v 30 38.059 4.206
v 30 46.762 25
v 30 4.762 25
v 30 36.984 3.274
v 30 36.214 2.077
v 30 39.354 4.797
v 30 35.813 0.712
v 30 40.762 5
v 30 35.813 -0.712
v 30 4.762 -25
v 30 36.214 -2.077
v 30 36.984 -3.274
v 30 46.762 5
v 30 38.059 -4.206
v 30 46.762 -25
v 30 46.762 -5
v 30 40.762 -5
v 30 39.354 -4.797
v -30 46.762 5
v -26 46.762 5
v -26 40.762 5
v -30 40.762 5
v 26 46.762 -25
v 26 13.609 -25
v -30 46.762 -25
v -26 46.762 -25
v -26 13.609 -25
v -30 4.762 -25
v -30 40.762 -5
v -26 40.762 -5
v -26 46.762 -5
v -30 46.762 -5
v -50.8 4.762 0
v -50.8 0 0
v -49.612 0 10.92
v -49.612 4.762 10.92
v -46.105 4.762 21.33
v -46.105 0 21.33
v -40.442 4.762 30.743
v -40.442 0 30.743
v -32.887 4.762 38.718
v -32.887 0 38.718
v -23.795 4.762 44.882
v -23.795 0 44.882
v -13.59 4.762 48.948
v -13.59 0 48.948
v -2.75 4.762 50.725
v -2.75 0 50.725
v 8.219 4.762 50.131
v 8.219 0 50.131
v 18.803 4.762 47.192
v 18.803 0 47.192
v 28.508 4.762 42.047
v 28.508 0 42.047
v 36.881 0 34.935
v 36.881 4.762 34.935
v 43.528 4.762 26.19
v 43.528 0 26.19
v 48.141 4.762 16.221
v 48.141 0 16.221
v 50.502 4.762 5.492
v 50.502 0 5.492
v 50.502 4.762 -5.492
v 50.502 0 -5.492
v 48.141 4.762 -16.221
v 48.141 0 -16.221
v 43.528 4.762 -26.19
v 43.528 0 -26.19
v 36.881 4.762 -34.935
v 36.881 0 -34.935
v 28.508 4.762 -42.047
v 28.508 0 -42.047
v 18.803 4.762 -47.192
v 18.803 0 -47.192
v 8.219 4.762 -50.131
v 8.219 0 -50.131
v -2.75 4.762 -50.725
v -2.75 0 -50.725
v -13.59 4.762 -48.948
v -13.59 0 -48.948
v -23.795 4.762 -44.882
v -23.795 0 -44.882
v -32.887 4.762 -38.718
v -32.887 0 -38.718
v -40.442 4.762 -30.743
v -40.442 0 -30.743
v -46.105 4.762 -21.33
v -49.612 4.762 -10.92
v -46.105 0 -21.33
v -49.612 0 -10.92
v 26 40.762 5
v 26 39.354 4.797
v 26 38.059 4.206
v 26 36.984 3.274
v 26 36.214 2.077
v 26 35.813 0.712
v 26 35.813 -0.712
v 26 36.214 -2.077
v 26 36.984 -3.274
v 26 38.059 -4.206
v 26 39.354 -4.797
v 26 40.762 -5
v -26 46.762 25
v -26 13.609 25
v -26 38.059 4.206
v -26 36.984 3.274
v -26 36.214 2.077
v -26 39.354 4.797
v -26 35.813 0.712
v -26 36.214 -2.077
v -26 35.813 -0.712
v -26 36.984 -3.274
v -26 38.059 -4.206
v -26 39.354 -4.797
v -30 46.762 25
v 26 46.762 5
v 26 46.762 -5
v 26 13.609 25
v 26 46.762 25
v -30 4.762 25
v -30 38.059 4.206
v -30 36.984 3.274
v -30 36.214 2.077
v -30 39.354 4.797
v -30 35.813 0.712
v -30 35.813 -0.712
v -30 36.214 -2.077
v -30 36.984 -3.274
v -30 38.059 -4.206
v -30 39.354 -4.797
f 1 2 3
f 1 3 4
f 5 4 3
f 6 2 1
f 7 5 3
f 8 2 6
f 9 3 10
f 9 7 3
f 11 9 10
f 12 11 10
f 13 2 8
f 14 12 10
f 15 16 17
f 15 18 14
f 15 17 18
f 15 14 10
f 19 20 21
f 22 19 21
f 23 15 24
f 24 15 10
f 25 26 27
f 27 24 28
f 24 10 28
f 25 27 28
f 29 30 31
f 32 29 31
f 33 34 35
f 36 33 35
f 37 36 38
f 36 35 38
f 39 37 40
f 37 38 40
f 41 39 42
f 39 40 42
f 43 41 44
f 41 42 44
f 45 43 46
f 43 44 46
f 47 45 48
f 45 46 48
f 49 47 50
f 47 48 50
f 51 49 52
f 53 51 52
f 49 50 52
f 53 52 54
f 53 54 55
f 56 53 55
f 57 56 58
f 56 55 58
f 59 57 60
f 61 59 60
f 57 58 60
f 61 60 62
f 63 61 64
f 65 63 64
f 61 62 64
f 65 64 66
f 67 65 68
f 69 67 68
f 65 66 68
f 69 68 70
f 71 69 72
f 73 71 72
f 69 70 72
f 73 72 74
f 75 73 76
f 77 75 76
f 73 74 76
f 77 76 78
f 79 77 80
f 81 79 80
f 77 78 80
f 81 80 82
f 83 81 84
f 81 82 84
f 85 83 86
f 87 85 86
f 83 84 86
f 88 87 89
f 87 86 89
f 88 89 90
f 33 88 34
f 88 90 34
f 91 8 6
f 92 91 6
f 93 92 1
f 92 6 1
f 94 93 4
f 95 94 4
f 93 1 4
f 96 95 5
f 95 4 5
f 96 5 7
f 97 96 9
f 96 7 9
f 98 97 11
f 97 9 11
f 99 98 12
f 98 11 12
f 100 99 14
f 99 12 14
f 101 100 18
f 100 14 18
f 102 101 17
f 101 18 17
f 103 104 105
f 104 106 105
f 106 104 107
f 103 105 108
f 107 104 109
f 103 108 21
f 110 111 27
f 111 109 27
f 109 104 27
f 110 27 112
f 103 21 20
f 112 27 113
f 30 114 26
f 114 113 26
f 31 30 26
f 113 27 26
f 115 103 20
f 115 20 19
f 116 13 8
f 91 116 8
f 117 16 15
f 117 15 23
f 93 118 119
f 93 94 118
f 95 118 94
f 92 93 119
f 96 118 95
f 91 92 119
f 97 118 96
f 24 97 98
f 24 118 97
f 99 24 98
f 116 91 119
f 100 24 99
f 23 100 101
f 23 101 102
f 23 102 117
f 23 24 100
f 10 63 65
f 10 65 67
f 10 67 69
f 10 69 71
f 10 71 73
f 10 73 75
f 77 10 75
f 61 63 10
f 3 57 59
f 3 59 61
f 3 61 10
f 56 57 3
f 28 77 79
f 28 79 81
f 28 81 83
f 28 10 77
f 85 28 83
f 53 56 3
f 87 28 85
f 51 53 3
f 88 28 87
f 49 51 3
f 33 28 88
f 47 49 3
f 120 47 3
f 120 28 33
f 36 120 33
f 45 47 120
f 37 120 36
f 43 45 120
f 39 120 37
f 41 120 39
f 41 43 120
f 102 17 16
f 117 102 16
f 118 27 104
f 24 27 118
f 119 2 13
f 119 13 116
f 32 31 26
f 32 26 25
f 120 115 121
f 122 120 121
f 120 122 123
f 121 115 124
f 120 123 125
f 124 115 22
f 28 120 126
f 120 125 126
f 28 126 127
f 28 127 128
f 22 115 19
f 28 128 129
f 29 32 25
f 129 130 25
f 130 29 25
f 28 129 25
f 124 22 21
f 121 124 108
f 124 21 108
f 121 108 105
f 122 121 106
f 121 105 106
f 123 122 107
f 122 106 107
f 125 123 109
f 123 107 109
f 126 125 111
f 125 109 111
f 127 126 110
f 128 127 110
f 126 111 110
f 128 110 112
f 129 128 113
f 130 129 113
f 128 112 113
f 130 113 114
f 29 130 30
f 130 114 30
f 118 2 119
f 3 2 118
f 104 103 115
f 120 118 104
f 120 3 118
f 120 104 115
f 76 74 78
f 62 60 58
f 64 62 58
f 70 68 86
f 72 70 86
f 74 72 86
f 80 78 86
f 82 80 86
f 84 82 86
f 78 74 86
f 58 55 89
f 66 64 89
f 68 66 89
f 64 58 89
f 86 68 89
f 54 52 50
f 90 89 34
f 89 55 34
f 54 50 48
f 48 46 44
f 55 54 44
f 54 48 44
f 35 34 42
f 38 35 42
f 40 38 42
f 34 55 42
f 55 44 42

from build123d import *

# Parameters (mm, degrees)
SKETCH2_R               = 50.8
BOSS_EXTRUDE1_DEPTH     = 4.7625
BOSS_EXTRUDE2_DEPTH     = 30
SKETCH7_W               = 60
SKETCH7_H               = 50
BOSS_EXTRUDE3_DEPTH     = 46.7625
CUT_EXTRUDE2_DEPTH      = 81.8
SKETCH5_W               = 52
SKETCH5_H               = 33.1537
CUT_EXTRUDE1_DEPTH      = 51.8
CUT_EXTRUDE1_DEPTH_BACK = 51.8


with BuildPart() as part:
    # Sketch2 → Boss-Extrude1 (new body)
    with BuildSketch(Plane(origin=(0, 0, 0), x_dir=(-1, 0, 0), z_dir=(0, 1, 0))):
        Circle(SKETCH2_R)
    extrude(amount=BOSS_EXTRUDE1_DEPTH)

    # Sketch4 → Boss-Extrude2 (add, symmetric)
    with BuildSketch(Plane(origin=(0, 0, 0), x_dir=(0, 0, -1), z_dir=(1, 0, 0))):
        Polygon((-25, 4.7625), (25, 4.7625), (16, 46.7625), (-16, 46.7625), align=None)
    extrude(amount=BOSS_EXTRUDE2_DEPTH, both=True)

    # Sketch7 → Boss-Extrude3 (add)
    with BuildSketch(Plane(origin=(0, 0, 0), x_dir=(-1, 0, 0), z_dir=(0, 1, 0))):
        Rectangle(SKETCH7_W, SKETCH7_H)
    extrude(amount=BOSS_EXTRUDE3_DEPTH)

    # Sketch6 → Cut-Extrude2 (cut, through all)
    with BuildSketch(Plane(origin=(30, 0, 0), x_dir=(0, 0, -1), z_dir=(1, 0, 0))):
        with BuildLine():
            Line((5, 40.7625), (5, 46.7625))
            Line((5, 46.7625), (-5, 46.7625))
            Line((-5, 46.7625), (-5, 40.7625))
            ThreePointArc((-5, 40.7625), (0, 35.7625), (5, 40.7625))
        make_face()
    extrude(amount=-CUT_EXTRUDE2_DEPTH, mode=Mode.SUBTRACT)

    # Sketch5 → Cut-Extrude1 (cut, two sides)
    with BuildSketch(Plane.XY) as cut_extrude1_sk:
        with Locations((0, 30.18565)):
            Rectangle(SKETCH5_W, SKETCH5_H)
    extrude(amount=CUT_EXTRUDE1_DEPTH, mode=Mode.SUBTRACT)
    extrude(cut_extrude1_sk.sketch, amount=-CUT_EXTRUDE1_DEPTH_BACK, mode=Mode.SUBTRACT)


solid = part.part
